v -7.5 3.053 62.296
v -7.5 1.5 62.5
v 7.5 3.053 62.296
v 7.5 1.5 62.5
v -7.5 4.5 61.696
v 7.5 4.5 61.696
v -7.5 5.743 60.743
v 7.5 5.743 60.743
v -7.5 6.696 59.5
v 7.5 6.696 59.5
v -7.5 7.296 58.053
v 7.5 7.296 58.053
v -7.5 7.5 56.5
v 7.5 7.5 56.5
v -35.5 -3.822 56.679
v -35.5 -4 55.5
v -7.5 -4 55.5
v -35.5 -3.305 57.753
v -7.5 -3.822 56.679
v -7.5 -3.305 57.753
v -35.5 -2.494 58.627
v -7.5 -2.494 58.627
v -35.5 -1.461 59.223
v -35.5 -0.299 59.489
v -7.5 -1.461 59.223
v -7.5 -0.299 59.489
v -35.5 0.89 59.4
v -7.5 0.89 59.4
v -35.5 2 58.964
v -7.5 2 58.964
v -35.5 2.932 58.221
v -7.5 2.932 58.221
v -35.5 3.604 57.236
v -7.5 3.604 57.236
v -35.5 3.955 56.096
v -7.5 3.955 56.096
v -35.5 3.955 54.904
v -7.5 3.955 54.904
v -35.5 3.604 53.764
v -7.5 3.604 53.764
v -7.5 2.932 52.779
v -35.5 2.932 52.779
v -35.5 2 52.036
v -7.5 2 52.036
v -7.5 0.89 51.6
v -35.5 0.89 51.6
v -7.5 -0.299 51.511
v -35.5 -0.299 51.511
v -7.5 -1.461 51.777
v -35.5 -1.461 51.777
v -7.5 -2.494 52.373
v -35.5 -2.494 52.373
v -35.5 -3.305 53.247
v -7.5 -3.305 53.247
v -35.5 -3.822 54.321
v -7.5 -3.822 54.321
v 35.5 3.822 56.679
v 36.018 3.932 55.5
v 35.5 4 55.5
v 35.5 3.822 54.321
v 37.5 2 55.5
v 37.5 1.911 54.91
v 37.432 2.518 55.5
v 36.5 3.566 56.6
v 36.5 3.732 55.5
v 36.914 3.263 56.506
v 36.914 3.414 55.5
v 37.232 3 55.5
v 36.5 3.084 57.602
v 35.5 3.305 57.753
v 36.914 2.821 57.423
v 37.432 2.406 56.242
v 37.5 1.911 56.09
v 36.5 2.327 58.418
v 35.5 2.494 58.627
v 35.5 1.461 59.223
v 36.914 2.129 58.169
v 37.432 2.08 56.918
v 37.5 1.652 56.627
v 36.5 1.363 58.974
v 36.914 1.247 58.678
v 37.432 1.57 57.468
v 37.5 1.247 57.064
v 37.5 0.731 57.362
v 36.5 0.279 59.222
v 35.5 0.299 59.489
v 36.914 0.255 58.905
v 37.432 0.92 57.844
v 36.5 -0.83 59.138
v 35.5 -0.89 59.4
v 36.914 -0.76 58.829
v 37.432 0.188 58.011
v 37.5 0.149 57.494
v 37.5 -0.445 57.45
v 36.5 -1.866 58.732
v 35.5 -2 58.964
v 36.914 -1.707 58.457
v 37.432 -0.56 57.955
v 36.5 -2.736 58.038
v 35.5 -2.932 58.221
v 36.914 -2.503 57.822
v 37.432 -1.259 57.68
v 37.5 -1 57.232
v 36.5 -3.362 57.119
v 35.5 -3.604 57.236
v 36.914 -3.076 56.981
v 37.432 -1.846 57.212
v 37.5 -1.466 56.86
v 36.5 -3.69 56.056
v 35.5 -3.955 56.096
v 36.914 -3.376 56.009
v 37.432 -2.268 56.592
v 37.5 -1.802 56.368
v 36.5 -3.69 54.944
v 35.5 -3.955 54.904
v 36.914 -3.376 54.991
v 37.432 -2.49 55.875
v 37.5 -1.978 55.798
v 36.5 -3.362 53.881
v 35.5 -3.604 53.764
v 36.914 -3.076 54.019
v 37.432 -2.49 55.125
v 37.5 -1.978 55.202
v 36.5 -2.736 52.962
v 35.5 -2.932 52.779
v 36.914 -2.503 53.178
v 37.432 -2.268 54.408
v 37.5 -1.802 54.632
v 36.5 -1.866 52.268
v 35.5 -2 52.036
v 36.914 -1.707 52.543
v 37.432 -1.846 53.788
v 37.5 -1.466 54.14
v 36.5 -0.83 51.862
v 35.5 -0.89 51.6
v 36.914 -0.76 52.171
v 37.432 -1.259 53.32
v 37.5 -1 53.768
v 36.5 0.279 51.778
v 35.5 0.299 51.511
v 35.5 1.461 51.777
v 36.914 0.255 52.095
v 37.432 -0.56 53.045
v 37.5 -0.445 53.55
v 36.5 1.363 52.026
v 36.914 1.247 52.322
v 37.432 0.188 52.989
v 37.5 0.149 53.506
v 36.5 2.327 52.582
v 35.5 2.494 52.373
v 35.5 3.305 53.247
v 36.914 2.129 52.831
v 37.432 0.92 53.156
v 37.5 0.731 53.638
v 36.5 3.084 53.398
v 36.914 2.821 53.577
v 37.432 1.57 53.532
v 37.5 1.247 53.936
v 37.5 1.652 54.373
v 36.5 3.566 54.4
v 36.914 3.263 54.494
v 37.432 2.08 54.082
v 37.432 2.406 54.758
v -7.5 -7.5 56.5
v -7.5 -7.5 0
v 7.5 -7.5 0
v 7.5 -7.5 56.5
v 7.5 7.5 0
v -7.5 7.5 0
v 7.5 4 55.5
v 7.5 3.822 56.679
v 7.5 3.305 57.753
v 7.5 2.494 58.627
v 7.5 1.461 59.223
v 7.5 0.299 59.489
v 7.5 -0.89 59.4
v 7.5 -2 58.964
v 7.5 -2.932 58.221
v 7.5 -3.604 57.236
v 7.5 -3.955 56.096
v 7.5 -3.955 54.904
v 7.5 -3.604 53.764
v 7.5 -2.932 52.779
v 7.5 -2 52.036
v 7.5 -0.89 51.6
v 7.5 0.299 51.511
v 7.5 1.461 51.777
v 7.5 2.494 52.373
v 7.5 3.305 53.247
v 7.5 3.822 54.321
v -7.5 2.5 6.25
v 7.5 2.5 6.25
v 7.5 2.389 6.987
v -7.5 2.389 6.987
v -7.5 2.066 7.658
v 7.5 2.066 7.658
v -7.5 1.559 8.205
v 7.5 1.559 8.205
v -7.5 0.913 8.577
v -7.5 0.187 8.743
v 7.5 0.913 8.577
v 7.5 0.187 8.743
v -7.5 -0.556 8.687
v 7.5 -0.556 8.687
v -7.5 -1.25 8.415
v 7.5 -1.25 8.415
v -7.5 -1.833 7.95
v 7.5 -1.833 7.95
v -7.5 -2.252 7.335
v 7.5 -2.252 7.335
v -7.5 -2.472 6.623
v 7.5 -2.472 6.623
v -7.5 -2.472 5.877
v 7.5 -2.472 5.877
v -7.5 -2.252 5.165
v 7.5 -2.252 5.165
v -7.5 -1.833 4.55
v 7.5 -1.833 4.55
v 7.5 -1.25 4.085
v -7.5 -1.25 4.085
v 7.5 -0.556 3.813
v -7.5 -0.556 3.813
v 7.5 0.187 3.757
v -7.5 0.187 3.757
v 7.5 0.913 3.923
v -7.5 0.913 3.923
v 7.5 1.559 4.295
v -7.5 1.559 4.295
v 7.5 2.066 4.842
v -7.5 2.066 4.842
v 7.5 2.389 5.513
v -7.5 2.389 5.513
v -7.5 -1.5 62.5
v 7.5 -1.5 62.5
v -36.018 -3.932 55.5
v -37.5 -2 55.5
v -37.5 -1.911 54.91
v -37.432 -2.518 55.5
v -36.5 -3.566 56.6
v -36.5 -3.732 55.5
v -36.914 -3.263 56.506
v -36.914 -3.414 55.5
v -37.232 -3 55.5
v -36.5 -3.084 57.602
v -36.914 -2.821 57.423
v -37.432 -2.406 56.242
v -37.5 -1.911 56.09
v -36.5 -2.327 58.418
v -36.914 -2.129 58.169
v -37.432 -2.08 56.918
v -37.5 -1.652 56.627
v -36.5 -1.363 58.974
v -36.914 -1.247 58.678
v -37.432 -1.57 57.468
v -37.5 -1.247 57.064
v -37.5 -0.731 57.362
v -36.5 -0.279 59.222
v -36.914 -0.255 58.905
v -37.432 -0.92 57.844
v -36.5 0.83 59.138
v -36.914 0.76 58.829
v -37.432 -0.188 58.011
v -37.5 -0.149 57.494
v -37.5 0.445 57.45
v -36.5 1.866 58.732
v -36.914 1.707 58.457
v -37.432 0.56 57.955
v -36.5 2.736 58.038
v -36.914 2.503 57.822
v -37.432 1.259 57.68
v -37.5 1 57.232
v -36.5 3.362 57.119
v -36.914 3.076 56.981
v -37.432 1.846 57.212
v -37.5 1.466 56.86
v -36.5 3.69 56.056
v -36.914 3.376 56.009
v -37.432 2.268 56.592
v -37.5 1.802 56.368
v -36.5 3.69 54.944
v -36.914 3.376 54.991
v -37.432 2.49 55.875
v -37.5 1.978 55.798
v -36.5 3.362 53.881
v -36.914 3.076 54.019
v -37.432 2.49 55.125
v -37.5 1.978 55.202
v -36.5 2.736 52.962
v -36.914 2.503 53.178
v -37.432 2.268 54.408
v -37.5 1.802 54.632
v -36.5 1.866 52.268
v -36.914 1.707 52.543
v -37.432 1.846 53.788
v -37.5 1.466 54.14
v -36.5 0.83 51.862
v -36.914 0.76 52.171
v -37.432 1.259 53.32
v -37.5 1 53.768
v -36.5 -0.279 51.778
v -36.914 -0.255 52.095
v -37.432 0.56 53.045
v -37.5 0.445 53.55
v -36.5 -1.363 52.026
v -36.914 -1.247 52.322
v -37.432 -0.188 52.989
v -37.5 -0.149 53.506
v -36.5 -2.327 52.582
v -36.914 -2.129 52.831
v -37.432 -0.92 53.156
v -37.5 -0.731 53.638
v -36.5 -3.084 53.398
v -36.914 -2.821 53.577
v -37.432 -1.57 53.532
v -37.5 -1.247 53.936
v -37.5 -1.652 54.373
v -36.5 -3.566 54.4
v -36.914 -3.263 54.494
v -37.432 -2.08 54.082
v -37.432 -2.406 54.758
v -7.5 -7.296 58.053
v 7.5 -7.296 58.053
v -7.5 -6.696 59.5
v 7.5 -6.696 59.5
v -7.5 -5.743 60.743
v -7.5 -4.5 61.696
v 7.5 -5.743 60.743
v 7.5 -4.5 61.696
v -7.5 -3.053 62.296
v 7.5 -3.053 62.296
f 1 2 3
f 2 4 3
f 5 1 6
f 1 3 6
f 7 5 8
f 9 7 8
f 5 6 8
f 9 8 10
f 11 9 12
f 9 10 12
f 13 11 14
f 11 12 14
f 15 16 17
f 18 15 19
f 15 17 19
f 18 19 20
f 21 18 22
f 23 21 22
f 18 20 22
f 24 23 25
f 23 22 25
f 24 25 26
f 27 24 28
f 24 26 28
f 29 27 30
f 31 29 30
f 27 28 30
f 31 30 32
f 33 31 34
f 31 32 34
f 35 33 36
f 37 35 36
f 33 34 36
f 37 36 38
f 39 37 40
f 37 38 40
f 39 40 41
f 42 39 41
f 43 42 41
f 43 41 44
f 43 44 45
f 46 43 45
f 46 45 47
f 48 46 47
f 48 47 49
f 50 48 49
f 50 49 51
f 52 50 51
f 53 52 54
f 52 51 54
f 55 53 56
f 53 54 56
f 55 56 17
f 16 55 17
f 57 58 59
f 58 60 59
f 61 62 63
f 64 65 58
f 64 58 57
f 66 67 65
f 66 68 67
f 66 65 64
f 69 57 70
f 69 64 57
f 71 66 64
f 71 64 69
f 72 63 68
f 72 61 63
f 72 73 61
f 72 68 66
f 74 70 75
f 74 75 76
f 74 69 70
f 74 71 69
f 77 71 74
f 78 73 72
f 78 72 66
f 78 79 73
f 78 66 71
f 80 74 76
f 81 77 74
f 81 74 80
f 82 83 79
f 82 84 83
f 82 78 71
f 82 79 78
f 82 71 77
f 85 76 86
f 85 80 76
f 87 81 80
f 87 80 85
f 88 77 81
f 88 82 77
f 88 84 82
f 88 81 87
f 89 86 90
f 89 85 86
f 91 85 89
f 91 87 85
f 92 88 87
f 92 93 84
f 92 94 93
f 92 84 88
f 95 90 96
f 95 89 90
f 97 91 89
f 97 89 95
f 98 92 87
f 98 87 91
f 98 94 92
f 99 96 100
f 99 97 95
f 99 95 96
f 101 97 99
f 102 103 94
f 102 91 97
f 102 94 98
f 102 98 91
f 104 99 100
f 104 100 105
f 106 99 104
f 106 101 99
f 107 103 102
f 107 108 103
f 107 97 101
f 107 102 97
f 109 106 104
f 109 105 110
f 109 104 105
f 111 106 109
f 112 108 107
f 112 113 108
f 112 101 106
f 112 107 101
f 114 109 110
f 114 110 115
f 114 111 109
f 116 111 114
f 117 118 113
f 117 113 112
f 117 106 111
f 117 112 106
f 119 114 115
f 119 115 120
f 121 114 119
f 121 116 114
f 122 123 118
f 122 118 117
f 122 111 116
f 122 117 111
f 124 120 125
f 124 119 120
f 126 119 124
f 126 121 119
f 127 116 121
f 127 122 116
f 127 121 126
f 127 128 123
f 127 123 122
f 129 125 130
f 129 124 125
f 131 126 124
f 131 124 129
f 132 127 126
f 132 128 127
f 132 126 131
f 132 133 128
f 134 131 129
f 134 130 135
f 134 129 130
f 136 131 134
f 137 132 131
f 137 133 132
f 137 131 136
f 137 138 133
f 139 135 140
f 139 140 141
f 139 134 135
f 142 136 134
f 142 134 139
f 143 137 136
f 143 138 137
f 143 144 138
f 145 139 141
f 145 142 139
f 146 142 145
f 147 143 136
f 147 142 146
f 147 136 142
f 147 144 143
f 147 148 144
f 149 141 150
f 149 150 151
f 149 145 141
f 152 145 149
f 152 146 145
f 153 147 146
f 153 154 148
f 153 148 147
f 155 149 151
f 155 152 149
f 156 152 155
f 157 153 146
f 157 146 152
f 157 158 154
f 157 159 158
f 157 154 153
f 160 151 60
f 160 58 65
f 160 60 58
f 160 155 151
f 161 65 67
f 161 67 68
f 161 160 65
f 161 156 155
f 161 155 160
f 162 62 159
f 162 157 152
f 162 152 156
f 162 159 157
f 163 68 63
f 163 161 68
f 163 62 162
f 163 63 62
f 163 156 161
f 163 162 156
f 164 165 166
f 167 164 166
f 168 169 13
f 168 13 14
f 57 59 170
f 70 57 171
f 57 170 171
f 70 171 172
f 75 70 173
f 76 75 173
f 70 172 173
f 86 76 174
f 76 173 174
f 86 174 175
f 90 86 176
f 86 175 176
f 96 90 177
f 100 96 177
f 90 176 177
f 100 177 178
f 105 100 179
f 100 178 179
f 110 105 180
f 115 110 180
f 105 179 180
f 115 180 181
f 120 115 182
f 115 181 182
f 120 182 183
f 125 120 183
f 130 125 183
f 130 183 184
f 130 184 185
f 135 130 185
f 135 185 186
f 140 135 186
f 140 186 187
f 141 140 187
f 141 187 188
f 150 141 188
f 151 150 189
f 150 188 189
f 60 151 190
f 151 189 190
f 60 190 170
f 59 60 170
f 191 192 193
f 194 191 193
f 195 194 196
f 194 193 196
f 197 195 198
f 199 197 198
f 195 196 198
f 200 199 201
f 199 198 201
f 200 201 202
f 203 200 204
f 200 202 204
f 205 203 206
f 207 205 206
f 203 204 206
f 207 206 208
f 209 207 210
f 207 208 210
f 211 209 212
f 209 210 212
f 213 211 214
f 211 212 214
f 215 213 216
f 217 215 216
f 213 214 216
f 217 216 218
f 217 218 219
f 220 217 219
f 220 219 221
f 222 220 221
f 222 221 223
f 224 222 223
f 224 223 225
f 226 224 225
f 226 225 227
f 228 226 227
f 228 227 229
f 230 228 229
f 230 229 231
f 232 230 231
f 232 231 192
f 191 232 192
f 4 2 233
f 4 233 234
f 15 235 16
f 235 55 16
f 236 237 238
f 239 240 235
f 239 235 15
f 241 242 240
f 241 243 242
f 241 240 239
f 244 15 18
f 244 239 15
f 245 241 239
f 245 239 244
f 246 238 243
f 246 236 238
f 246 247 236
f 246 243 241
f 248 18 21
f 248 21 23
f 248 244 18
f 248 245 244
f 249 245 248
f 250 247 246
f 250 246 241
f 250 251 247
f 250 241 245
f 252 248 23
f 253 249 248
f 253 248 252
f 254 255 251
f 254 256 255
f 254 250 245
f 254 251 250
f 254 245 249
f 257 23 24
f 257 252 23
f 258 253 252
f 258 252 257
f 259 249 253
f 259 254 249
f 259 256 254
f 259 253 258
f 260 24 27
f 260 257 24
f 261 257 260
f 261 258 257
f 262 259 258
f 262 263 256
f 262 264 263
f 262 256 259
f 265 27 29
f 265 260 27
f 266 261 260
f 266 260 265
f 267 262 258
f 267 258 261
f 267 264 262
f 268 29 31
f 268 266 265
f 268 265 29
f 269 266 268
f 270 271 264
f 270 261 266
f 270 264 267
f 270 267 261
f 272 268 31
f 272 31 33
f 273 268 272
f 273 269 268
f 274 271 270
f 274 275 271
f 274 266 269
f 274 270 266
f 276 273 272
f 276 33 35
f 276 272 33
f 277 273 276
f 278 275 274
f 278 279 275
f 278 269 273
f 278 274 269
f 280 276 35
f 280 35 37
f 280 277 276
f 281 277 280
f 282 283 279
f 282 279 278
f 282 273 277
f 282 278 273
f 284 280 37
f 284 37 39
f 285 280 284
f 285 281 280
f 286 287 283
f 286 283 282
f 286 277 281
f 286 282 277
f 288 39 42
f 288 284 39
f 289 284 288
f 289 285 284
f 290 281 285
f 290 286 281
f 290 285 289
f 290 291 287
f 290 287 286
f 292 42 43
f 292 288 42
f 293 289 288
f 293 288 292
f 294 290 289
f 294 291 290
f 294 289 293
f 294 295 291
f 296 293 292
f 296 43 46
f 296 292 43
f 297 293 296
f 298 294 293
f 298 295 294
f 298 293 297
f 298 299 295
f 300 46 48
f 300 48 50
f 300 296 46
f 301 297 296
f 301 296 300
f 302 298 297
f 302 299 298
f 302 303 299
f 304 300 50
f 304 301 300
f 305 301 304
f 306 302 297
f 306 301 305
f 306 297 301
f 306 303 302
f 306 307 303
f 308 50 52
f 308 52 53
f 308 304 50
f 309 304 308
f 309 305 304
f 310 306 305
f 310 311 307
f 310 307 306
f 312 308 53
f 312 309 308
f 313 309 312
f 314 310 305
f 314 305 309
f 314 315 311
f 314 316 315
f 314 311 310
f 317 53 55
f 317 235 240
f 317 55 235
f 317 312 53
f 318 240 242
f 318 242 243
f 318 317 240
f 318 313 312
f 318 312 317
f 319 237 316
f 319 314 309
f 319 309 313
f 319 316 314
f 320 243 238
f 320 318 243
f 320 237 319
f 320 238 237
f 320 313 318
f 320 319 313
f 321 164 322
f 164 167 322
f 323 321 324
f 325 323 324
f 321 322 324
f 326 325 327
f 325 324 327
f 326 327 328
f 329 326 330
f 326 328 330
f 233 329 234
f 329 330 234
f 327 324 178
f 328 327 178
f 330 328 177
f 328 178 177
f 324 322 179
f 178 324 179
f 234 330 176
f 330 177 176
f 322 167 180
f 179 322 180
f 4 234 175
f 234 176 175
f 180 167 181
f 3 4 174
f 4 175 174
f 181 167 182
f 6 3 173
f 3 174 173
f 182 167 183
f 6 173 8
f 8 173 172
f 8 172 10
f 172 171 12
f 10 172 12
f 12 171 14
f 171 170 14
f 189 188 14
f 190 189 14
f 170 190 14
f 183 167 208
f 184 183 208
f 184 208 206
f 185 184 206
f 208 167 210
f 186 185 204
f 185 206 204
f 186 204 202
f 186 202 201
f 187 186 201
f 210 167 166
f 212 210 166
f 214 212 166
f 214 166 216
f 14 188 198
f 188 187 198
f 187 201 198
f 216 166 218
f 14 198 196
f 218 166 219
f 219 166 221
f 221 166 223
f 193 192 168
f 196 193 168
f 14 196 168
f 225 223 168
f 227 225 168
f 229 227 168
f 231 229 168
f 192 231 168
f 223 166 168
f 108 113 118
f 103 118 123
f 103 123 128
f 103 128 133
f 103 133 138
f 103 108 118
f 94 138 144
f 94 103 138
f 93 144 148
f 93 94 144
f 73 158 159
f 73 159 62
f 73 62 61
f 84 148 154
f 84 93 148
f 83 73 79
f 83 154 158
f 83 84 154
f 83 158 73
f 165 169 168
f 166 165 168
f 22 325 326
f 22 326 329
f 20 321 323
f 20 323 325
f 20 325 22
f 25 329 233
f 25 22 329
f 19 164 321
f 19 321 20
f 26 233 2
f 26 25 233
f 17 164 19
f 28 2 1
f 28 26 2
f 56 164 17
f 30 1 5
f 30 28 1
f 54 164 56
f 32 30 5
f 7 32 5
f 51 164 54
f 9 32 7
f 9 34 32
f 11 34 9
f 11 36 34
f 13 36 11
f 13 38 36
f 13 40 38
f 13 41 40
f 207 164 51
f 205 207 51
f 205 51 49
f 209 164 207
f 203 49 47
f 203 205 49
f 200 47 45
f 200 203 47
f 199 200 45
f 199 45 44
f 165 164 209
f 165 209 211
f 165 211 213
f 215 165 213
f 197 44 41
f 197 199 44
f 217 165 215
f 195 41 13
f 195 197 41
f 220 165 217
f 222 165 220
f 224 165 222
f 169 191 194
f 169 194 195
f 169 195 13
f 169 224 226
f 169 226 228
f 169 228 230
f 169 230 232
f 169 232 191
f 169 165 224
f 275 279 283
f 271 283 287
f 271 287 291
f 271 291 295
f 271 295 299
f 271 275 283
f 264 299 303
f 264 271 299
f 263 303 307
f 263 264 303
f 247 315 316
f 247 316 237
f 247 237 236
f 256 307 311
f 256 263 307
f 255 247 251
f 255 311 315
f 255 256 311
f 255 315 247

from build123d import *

# Parameters (mm, degrees)
F0_W     = 15
F0_H     = 15
F1_DEPTH = 62.5
F3_R     = 6
F4_R     = 6
F2_R     = 4
F5_DEPTH = 30
F6_R     = 4
F7_DEPTH = 30
F9_D     = 5
F10_R    = 2
F11_R    = 2


with BuildPart() as f1:
    # F0 (on Top) → F1 (new body)
    with BuildSketch(Plane.XY):
        Rectangle(F0_W, F0_H)
    extrude(amount=F1_DEPTH)

    # F3
    f3_edges = [f1.edges().sort_by_distance(p)[0] for p in [
        (0, -7.5, 62.5),
    ]]
    fillet(f3_edges, radius=F3_R)

    # F4
    f4_edges = [f1.edges().sort_by_distance(p)[0] for p in [
        (0, 7.5, 62.5),
    ]]
    fillet(f4_edges, radius=F4_R)

    # F2 (on face) → F5 (join)
    with BuildSketch(Plane(origin=(-7.5, 0, 0), x_dir=(0, -1, 0), z_dir=(-1, 0, 0))):
        with Locations((0, 55.5)):
            Circle(F2_R)
    extrude(amount=F5_DEPTH)

    # F6 (on face) → F7 (join)
    with BuildSketch(Plane.YZ.offset(7.5)):
        with Locations((0, 55.5)):
            Circle(F6_R)
    extrude(amount=F7_DEPTH)

    # F9 (through all)
    with Locations(Plane(origin=(-7.5, 0, 0), x_dir=(0, -1, 0), z_dir=(-1, 0, 0))):
        with Locations((0, 6.25)):
            Hole(F9_D / 2)

    # F10
    f10_edges = [f1.edges().sort_by_distance(p)[0] for p in [
        (37.5, -4, 55.5),
    ]]
    fillet(f10_edges, radius=F10_R)

    # F11
    f11_edges = [f1.edges().sort_by_distance(p)[0] for p in [
        (-37.5, 4, 55.5),
    ]]
    fillet(f11_edges, radius=F11_R)


solid = f1.part
